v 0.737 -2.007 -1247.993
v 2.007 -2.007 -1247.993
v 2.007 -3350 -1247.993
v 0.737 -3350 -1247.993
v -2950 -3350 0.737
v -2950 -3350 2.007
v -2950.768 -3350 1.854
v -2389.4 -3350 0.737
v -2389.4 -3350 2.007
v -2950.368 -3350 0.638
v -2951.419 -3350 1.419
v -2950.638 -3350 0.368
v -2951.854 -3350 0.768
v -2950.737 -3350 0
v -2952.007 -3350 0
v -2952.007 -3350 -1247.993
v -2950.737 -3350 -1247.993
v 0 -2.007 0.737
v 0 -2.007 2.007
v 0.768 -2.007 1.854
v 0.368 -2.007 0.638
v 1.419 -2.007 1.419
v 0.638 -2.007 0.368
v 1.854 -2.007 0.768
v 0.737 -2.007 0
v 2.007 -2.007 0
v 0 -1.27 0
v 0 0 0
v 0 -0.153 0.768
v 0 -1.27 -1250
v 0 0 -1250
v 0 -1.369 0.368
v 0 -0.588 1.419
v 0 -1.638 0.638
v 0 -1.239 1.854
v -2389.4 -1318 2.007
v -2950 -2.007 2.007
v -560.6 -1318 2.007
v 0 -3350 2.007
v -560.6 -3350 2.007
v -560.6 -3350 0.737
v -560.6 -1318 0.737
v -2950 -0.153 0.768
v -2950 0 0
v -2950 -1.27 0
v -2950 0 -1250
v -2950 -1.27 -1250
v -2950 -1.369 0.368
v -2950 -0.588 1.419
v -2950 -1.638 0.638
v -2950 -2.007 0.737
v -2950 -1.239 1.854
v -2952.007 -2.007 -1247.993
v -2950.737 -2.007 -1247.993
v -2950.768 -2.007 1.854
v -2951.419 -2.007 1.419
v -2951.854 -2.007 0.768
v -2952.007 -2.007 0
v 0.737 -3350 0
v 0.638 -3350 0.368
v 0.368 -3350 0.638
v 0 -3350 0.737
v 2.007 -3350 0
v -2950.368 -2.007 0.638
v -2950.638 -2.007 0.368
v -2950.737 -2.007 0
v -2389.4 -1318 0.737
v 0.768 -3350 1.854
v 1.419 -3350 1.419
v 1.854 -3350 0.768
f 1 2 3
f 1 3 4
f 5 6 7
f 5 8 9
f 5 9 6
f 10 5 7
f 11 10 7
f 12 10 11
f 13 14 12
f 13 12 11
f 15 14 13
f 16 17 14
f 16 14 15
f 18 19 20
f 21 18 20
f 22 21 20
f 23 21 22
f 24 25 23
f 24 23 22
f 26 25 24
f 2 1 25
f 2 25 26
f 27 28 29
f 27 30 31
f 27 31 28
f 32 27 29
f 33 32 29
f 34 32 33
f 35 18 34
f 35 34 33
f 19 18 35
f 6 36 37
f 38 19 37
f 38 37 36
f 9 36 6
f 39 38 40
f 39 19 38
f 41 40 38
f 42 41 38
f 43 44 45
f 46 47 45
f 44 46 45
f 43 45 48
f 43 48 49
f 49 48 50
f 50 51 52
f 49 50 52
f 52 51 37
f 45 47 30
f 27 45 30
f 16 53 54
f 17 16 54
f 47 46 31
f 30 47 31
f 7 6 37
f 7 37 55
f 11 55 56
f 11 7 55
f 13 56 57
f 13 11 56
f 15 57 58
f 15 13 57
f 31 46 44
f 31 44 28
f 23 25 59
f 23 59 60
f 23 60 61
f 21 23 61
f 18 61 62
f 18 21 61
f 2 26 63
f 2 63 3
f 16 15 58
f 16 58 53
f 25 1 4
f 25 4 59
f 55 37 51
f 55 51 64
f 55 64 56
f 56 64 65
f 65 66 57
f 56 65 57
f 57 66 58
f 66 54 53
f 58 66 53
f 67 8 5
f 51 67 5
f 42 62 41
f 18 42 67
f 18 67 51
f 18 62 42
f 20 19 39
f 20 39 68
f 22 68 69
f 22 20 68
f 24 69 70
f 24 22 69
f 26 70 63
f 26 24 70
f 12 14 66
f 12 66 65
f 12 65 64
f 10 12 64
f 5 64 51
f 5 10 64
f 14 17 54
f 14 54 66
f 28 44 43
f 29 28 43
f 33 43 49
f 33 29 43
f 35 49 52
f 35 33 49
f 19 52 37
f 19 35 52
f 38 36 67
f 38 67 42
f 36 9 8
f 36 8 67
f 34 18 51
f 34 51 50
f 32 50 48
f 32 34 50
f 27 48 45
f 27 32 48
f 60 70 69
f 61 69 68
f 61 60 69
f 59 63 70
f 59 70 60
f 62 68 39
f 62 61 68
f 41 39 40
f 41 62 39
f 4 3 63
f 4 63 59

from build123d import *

# Parameters (mm, degrees)
SKETCH1_W          = 2950
SKETCH1_H          = 1250
BASE_FLANGE1_DEPTH = 1.27
EDGE_FLANGE1_DEPTH = 2950
EDGE_FLANGE2_DEPTH = 3347.9934
EDGE_FLANGE3_DEPTH = 3347.9934
CUT_EXTRUDE1_REACH = 4639.28
SKETCH16_W         = 1828.8
SKETCH16_H         = 2032


# Sheet-metal steps are written as plain solids
with BuildPart() as part:
    # Sketch1 → Base-Flange1 (new body)
    with BuildSketch(Plane(origin=(0, 0, 0), x_dir=(1, 0, 0), z_dir=(0, 1, 0))):
        with Locations((-1475, 625)):
            Rectangle(SKETCH1_W, SKETCH1_H)
    extrude(amount=-BASE_FLANGE1_DEPTH)

    # Edge-Flange1 section (across the edge) → Edge-Flange1 (add)
    with BuildSketch(Plane(origin=(0, -1.27, 0.7366), x_dir=(0, 0, -1), z_dir=(-1, 0, 0))):
        with BuildLine():
            Line((-1.27, 0.7366), (-1.27, 3348.73))
            Line((-1.27, 3348.73), (0, 3348.73))
            Line((0, 3348.73), (0, 0.7366))
            ThreePointArc((0, 0.7366), (0.215745145, 0.215745145), (0.7366, 0))
            Line((0.7366, 0), (0.7366, -1.27))
            ThreePointArc((0.7366, -1.27), (-0.682280467, -0.682280467), (-1.27, 0.7366))
        make_face()
    extrude(amount=EDGE_FLANGE1_DEPTH)

    # Edge-Flange2 section (across the edge) → Edge-Flange2 (add)
    with BuildSketch(Plane(origin=(0.7366, -2.0066, 0.7366), x_dir=(-1, 0, 0), z_dir=(0, -1, 0))):
        with BuildLine():
            Line((-1.27, 0.7366), (-1.27, 1248.73))
            Line((-1.27, 1248.73), (0, 1248.73))
            Line((0, 1248.73), (0, 0.7366))
            ThreePointArc((0, 0.7366), (0.215745145, 0.215745145), (0.7366, 0))
            Line((0.7366, 0), (0.7366, -1.27))
            ThreePointArc((0.7366, -1.27), (-0.682280467, -0.682280467), (-1.27, 0.7366))
        make_face()
    extrude(amount=EDGE_FLANGE2_DEPTH)

    # Edge-Flange3 section (across the edge) → Edge-Flange3 (add)
    with BuildSketch(Plane(origin=(-2950.7366, -3350, 0.7366), x_dir=(1, 0, 0), z_dir=(0, 1, 0))):
        with BuildLine():
            Line((-1.27, 0.7366), (-1.27, 1248.73))
            Line((-1.27, 1248.73), (0, 1248.73))
            Line((0, 1248.73), (0, 0.7366))
            ThreePointArc((0, 0.7366), (0.215745145, 0.215745145), (0.7366, 0))
            Line((0.7366, 0), (0.7366, -1.27))
            ThreePointArc((0.7366, -1.27), (-0.682280467, -0.682280467), (-1.27, 0.7366))
        make_face()
    extrude(amount=EDGE_FLANGE3_DEPTH)

    # Sketch16 → Cut-Extrude1 (cut, up to next)
    with BuildSketch(Plane.XY.offset(2.0066), mode=Mode.PRIVATE) as cut_extrude1_sk1:
        with Locations((-1475, -2334)):
            Rectangle(SKETCH16_W, SKETCH16_H)
    cut_extrude1_tool1 = extrude(cut_extrude1_sk1.sketch, amount=-CUT_EXTRUDE1_REACH, mode=Mode.PRIVATE) & part.part
    add(cut_extrude1_tool1.solids().sort_by_distance((-1475, -2334, 2.0066))[0], mode=Mode.SUBTRACT)


solid = part.part
